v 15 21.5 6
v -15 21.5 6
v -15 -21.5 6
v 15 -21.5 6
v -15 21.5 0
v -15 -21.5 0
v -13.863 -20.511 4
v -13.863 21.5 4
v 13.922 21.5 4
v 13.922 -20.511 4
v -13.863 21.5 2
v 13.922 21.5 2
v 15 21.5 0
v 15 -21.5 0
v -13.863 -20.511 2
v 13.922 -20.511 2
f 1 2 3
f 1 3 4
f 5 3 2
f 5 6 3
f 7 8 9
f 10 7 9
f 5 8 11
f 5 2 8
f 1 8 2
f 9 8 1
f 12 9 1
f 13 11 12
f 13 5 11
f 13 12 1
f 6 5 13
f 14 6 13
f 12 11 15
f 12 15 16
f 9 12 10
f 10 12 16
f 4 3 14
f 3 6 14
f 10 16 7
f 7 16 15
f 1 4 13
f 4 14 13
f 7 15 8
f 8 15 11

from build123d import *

# Parameters (mm, degrees)
F0_W     = 30
F0_H     = 43
F1_DEPTH = 2
F3_DEPTH = 2
F4_W     = 30
F4_H     = 43
F5_DEPTH = 2


with BuildPart() as f1:
    # F0 (on Top) → F1 (new body)
    with BuildSketch(Plane.XY):
        Rectangle(F0_W, F0_H)
    extrude(amount=F1_DEPTH)

    # F2 (on face) → F3 (join)
    with BuildSketch(Plane.XY.offset(2)):
        Polygon((-13.862556, -20.510625), (-13.862556, 21.5), (-15, 21.5), (-15, -21.5), (15, -21.5), (15, 21.5), (13.922185, 21.5), (13.922185, -20.510625), align=None)
    extrude(amount=F3_DEPTH)

    # F4 (on face) → F5 (join)
    with BuildSketch(Plane.XY.offset(4)):
        Rectangle(F4_W, F4_H)
    extrude(amount=F5_DEPTH)


solid = f1.part
